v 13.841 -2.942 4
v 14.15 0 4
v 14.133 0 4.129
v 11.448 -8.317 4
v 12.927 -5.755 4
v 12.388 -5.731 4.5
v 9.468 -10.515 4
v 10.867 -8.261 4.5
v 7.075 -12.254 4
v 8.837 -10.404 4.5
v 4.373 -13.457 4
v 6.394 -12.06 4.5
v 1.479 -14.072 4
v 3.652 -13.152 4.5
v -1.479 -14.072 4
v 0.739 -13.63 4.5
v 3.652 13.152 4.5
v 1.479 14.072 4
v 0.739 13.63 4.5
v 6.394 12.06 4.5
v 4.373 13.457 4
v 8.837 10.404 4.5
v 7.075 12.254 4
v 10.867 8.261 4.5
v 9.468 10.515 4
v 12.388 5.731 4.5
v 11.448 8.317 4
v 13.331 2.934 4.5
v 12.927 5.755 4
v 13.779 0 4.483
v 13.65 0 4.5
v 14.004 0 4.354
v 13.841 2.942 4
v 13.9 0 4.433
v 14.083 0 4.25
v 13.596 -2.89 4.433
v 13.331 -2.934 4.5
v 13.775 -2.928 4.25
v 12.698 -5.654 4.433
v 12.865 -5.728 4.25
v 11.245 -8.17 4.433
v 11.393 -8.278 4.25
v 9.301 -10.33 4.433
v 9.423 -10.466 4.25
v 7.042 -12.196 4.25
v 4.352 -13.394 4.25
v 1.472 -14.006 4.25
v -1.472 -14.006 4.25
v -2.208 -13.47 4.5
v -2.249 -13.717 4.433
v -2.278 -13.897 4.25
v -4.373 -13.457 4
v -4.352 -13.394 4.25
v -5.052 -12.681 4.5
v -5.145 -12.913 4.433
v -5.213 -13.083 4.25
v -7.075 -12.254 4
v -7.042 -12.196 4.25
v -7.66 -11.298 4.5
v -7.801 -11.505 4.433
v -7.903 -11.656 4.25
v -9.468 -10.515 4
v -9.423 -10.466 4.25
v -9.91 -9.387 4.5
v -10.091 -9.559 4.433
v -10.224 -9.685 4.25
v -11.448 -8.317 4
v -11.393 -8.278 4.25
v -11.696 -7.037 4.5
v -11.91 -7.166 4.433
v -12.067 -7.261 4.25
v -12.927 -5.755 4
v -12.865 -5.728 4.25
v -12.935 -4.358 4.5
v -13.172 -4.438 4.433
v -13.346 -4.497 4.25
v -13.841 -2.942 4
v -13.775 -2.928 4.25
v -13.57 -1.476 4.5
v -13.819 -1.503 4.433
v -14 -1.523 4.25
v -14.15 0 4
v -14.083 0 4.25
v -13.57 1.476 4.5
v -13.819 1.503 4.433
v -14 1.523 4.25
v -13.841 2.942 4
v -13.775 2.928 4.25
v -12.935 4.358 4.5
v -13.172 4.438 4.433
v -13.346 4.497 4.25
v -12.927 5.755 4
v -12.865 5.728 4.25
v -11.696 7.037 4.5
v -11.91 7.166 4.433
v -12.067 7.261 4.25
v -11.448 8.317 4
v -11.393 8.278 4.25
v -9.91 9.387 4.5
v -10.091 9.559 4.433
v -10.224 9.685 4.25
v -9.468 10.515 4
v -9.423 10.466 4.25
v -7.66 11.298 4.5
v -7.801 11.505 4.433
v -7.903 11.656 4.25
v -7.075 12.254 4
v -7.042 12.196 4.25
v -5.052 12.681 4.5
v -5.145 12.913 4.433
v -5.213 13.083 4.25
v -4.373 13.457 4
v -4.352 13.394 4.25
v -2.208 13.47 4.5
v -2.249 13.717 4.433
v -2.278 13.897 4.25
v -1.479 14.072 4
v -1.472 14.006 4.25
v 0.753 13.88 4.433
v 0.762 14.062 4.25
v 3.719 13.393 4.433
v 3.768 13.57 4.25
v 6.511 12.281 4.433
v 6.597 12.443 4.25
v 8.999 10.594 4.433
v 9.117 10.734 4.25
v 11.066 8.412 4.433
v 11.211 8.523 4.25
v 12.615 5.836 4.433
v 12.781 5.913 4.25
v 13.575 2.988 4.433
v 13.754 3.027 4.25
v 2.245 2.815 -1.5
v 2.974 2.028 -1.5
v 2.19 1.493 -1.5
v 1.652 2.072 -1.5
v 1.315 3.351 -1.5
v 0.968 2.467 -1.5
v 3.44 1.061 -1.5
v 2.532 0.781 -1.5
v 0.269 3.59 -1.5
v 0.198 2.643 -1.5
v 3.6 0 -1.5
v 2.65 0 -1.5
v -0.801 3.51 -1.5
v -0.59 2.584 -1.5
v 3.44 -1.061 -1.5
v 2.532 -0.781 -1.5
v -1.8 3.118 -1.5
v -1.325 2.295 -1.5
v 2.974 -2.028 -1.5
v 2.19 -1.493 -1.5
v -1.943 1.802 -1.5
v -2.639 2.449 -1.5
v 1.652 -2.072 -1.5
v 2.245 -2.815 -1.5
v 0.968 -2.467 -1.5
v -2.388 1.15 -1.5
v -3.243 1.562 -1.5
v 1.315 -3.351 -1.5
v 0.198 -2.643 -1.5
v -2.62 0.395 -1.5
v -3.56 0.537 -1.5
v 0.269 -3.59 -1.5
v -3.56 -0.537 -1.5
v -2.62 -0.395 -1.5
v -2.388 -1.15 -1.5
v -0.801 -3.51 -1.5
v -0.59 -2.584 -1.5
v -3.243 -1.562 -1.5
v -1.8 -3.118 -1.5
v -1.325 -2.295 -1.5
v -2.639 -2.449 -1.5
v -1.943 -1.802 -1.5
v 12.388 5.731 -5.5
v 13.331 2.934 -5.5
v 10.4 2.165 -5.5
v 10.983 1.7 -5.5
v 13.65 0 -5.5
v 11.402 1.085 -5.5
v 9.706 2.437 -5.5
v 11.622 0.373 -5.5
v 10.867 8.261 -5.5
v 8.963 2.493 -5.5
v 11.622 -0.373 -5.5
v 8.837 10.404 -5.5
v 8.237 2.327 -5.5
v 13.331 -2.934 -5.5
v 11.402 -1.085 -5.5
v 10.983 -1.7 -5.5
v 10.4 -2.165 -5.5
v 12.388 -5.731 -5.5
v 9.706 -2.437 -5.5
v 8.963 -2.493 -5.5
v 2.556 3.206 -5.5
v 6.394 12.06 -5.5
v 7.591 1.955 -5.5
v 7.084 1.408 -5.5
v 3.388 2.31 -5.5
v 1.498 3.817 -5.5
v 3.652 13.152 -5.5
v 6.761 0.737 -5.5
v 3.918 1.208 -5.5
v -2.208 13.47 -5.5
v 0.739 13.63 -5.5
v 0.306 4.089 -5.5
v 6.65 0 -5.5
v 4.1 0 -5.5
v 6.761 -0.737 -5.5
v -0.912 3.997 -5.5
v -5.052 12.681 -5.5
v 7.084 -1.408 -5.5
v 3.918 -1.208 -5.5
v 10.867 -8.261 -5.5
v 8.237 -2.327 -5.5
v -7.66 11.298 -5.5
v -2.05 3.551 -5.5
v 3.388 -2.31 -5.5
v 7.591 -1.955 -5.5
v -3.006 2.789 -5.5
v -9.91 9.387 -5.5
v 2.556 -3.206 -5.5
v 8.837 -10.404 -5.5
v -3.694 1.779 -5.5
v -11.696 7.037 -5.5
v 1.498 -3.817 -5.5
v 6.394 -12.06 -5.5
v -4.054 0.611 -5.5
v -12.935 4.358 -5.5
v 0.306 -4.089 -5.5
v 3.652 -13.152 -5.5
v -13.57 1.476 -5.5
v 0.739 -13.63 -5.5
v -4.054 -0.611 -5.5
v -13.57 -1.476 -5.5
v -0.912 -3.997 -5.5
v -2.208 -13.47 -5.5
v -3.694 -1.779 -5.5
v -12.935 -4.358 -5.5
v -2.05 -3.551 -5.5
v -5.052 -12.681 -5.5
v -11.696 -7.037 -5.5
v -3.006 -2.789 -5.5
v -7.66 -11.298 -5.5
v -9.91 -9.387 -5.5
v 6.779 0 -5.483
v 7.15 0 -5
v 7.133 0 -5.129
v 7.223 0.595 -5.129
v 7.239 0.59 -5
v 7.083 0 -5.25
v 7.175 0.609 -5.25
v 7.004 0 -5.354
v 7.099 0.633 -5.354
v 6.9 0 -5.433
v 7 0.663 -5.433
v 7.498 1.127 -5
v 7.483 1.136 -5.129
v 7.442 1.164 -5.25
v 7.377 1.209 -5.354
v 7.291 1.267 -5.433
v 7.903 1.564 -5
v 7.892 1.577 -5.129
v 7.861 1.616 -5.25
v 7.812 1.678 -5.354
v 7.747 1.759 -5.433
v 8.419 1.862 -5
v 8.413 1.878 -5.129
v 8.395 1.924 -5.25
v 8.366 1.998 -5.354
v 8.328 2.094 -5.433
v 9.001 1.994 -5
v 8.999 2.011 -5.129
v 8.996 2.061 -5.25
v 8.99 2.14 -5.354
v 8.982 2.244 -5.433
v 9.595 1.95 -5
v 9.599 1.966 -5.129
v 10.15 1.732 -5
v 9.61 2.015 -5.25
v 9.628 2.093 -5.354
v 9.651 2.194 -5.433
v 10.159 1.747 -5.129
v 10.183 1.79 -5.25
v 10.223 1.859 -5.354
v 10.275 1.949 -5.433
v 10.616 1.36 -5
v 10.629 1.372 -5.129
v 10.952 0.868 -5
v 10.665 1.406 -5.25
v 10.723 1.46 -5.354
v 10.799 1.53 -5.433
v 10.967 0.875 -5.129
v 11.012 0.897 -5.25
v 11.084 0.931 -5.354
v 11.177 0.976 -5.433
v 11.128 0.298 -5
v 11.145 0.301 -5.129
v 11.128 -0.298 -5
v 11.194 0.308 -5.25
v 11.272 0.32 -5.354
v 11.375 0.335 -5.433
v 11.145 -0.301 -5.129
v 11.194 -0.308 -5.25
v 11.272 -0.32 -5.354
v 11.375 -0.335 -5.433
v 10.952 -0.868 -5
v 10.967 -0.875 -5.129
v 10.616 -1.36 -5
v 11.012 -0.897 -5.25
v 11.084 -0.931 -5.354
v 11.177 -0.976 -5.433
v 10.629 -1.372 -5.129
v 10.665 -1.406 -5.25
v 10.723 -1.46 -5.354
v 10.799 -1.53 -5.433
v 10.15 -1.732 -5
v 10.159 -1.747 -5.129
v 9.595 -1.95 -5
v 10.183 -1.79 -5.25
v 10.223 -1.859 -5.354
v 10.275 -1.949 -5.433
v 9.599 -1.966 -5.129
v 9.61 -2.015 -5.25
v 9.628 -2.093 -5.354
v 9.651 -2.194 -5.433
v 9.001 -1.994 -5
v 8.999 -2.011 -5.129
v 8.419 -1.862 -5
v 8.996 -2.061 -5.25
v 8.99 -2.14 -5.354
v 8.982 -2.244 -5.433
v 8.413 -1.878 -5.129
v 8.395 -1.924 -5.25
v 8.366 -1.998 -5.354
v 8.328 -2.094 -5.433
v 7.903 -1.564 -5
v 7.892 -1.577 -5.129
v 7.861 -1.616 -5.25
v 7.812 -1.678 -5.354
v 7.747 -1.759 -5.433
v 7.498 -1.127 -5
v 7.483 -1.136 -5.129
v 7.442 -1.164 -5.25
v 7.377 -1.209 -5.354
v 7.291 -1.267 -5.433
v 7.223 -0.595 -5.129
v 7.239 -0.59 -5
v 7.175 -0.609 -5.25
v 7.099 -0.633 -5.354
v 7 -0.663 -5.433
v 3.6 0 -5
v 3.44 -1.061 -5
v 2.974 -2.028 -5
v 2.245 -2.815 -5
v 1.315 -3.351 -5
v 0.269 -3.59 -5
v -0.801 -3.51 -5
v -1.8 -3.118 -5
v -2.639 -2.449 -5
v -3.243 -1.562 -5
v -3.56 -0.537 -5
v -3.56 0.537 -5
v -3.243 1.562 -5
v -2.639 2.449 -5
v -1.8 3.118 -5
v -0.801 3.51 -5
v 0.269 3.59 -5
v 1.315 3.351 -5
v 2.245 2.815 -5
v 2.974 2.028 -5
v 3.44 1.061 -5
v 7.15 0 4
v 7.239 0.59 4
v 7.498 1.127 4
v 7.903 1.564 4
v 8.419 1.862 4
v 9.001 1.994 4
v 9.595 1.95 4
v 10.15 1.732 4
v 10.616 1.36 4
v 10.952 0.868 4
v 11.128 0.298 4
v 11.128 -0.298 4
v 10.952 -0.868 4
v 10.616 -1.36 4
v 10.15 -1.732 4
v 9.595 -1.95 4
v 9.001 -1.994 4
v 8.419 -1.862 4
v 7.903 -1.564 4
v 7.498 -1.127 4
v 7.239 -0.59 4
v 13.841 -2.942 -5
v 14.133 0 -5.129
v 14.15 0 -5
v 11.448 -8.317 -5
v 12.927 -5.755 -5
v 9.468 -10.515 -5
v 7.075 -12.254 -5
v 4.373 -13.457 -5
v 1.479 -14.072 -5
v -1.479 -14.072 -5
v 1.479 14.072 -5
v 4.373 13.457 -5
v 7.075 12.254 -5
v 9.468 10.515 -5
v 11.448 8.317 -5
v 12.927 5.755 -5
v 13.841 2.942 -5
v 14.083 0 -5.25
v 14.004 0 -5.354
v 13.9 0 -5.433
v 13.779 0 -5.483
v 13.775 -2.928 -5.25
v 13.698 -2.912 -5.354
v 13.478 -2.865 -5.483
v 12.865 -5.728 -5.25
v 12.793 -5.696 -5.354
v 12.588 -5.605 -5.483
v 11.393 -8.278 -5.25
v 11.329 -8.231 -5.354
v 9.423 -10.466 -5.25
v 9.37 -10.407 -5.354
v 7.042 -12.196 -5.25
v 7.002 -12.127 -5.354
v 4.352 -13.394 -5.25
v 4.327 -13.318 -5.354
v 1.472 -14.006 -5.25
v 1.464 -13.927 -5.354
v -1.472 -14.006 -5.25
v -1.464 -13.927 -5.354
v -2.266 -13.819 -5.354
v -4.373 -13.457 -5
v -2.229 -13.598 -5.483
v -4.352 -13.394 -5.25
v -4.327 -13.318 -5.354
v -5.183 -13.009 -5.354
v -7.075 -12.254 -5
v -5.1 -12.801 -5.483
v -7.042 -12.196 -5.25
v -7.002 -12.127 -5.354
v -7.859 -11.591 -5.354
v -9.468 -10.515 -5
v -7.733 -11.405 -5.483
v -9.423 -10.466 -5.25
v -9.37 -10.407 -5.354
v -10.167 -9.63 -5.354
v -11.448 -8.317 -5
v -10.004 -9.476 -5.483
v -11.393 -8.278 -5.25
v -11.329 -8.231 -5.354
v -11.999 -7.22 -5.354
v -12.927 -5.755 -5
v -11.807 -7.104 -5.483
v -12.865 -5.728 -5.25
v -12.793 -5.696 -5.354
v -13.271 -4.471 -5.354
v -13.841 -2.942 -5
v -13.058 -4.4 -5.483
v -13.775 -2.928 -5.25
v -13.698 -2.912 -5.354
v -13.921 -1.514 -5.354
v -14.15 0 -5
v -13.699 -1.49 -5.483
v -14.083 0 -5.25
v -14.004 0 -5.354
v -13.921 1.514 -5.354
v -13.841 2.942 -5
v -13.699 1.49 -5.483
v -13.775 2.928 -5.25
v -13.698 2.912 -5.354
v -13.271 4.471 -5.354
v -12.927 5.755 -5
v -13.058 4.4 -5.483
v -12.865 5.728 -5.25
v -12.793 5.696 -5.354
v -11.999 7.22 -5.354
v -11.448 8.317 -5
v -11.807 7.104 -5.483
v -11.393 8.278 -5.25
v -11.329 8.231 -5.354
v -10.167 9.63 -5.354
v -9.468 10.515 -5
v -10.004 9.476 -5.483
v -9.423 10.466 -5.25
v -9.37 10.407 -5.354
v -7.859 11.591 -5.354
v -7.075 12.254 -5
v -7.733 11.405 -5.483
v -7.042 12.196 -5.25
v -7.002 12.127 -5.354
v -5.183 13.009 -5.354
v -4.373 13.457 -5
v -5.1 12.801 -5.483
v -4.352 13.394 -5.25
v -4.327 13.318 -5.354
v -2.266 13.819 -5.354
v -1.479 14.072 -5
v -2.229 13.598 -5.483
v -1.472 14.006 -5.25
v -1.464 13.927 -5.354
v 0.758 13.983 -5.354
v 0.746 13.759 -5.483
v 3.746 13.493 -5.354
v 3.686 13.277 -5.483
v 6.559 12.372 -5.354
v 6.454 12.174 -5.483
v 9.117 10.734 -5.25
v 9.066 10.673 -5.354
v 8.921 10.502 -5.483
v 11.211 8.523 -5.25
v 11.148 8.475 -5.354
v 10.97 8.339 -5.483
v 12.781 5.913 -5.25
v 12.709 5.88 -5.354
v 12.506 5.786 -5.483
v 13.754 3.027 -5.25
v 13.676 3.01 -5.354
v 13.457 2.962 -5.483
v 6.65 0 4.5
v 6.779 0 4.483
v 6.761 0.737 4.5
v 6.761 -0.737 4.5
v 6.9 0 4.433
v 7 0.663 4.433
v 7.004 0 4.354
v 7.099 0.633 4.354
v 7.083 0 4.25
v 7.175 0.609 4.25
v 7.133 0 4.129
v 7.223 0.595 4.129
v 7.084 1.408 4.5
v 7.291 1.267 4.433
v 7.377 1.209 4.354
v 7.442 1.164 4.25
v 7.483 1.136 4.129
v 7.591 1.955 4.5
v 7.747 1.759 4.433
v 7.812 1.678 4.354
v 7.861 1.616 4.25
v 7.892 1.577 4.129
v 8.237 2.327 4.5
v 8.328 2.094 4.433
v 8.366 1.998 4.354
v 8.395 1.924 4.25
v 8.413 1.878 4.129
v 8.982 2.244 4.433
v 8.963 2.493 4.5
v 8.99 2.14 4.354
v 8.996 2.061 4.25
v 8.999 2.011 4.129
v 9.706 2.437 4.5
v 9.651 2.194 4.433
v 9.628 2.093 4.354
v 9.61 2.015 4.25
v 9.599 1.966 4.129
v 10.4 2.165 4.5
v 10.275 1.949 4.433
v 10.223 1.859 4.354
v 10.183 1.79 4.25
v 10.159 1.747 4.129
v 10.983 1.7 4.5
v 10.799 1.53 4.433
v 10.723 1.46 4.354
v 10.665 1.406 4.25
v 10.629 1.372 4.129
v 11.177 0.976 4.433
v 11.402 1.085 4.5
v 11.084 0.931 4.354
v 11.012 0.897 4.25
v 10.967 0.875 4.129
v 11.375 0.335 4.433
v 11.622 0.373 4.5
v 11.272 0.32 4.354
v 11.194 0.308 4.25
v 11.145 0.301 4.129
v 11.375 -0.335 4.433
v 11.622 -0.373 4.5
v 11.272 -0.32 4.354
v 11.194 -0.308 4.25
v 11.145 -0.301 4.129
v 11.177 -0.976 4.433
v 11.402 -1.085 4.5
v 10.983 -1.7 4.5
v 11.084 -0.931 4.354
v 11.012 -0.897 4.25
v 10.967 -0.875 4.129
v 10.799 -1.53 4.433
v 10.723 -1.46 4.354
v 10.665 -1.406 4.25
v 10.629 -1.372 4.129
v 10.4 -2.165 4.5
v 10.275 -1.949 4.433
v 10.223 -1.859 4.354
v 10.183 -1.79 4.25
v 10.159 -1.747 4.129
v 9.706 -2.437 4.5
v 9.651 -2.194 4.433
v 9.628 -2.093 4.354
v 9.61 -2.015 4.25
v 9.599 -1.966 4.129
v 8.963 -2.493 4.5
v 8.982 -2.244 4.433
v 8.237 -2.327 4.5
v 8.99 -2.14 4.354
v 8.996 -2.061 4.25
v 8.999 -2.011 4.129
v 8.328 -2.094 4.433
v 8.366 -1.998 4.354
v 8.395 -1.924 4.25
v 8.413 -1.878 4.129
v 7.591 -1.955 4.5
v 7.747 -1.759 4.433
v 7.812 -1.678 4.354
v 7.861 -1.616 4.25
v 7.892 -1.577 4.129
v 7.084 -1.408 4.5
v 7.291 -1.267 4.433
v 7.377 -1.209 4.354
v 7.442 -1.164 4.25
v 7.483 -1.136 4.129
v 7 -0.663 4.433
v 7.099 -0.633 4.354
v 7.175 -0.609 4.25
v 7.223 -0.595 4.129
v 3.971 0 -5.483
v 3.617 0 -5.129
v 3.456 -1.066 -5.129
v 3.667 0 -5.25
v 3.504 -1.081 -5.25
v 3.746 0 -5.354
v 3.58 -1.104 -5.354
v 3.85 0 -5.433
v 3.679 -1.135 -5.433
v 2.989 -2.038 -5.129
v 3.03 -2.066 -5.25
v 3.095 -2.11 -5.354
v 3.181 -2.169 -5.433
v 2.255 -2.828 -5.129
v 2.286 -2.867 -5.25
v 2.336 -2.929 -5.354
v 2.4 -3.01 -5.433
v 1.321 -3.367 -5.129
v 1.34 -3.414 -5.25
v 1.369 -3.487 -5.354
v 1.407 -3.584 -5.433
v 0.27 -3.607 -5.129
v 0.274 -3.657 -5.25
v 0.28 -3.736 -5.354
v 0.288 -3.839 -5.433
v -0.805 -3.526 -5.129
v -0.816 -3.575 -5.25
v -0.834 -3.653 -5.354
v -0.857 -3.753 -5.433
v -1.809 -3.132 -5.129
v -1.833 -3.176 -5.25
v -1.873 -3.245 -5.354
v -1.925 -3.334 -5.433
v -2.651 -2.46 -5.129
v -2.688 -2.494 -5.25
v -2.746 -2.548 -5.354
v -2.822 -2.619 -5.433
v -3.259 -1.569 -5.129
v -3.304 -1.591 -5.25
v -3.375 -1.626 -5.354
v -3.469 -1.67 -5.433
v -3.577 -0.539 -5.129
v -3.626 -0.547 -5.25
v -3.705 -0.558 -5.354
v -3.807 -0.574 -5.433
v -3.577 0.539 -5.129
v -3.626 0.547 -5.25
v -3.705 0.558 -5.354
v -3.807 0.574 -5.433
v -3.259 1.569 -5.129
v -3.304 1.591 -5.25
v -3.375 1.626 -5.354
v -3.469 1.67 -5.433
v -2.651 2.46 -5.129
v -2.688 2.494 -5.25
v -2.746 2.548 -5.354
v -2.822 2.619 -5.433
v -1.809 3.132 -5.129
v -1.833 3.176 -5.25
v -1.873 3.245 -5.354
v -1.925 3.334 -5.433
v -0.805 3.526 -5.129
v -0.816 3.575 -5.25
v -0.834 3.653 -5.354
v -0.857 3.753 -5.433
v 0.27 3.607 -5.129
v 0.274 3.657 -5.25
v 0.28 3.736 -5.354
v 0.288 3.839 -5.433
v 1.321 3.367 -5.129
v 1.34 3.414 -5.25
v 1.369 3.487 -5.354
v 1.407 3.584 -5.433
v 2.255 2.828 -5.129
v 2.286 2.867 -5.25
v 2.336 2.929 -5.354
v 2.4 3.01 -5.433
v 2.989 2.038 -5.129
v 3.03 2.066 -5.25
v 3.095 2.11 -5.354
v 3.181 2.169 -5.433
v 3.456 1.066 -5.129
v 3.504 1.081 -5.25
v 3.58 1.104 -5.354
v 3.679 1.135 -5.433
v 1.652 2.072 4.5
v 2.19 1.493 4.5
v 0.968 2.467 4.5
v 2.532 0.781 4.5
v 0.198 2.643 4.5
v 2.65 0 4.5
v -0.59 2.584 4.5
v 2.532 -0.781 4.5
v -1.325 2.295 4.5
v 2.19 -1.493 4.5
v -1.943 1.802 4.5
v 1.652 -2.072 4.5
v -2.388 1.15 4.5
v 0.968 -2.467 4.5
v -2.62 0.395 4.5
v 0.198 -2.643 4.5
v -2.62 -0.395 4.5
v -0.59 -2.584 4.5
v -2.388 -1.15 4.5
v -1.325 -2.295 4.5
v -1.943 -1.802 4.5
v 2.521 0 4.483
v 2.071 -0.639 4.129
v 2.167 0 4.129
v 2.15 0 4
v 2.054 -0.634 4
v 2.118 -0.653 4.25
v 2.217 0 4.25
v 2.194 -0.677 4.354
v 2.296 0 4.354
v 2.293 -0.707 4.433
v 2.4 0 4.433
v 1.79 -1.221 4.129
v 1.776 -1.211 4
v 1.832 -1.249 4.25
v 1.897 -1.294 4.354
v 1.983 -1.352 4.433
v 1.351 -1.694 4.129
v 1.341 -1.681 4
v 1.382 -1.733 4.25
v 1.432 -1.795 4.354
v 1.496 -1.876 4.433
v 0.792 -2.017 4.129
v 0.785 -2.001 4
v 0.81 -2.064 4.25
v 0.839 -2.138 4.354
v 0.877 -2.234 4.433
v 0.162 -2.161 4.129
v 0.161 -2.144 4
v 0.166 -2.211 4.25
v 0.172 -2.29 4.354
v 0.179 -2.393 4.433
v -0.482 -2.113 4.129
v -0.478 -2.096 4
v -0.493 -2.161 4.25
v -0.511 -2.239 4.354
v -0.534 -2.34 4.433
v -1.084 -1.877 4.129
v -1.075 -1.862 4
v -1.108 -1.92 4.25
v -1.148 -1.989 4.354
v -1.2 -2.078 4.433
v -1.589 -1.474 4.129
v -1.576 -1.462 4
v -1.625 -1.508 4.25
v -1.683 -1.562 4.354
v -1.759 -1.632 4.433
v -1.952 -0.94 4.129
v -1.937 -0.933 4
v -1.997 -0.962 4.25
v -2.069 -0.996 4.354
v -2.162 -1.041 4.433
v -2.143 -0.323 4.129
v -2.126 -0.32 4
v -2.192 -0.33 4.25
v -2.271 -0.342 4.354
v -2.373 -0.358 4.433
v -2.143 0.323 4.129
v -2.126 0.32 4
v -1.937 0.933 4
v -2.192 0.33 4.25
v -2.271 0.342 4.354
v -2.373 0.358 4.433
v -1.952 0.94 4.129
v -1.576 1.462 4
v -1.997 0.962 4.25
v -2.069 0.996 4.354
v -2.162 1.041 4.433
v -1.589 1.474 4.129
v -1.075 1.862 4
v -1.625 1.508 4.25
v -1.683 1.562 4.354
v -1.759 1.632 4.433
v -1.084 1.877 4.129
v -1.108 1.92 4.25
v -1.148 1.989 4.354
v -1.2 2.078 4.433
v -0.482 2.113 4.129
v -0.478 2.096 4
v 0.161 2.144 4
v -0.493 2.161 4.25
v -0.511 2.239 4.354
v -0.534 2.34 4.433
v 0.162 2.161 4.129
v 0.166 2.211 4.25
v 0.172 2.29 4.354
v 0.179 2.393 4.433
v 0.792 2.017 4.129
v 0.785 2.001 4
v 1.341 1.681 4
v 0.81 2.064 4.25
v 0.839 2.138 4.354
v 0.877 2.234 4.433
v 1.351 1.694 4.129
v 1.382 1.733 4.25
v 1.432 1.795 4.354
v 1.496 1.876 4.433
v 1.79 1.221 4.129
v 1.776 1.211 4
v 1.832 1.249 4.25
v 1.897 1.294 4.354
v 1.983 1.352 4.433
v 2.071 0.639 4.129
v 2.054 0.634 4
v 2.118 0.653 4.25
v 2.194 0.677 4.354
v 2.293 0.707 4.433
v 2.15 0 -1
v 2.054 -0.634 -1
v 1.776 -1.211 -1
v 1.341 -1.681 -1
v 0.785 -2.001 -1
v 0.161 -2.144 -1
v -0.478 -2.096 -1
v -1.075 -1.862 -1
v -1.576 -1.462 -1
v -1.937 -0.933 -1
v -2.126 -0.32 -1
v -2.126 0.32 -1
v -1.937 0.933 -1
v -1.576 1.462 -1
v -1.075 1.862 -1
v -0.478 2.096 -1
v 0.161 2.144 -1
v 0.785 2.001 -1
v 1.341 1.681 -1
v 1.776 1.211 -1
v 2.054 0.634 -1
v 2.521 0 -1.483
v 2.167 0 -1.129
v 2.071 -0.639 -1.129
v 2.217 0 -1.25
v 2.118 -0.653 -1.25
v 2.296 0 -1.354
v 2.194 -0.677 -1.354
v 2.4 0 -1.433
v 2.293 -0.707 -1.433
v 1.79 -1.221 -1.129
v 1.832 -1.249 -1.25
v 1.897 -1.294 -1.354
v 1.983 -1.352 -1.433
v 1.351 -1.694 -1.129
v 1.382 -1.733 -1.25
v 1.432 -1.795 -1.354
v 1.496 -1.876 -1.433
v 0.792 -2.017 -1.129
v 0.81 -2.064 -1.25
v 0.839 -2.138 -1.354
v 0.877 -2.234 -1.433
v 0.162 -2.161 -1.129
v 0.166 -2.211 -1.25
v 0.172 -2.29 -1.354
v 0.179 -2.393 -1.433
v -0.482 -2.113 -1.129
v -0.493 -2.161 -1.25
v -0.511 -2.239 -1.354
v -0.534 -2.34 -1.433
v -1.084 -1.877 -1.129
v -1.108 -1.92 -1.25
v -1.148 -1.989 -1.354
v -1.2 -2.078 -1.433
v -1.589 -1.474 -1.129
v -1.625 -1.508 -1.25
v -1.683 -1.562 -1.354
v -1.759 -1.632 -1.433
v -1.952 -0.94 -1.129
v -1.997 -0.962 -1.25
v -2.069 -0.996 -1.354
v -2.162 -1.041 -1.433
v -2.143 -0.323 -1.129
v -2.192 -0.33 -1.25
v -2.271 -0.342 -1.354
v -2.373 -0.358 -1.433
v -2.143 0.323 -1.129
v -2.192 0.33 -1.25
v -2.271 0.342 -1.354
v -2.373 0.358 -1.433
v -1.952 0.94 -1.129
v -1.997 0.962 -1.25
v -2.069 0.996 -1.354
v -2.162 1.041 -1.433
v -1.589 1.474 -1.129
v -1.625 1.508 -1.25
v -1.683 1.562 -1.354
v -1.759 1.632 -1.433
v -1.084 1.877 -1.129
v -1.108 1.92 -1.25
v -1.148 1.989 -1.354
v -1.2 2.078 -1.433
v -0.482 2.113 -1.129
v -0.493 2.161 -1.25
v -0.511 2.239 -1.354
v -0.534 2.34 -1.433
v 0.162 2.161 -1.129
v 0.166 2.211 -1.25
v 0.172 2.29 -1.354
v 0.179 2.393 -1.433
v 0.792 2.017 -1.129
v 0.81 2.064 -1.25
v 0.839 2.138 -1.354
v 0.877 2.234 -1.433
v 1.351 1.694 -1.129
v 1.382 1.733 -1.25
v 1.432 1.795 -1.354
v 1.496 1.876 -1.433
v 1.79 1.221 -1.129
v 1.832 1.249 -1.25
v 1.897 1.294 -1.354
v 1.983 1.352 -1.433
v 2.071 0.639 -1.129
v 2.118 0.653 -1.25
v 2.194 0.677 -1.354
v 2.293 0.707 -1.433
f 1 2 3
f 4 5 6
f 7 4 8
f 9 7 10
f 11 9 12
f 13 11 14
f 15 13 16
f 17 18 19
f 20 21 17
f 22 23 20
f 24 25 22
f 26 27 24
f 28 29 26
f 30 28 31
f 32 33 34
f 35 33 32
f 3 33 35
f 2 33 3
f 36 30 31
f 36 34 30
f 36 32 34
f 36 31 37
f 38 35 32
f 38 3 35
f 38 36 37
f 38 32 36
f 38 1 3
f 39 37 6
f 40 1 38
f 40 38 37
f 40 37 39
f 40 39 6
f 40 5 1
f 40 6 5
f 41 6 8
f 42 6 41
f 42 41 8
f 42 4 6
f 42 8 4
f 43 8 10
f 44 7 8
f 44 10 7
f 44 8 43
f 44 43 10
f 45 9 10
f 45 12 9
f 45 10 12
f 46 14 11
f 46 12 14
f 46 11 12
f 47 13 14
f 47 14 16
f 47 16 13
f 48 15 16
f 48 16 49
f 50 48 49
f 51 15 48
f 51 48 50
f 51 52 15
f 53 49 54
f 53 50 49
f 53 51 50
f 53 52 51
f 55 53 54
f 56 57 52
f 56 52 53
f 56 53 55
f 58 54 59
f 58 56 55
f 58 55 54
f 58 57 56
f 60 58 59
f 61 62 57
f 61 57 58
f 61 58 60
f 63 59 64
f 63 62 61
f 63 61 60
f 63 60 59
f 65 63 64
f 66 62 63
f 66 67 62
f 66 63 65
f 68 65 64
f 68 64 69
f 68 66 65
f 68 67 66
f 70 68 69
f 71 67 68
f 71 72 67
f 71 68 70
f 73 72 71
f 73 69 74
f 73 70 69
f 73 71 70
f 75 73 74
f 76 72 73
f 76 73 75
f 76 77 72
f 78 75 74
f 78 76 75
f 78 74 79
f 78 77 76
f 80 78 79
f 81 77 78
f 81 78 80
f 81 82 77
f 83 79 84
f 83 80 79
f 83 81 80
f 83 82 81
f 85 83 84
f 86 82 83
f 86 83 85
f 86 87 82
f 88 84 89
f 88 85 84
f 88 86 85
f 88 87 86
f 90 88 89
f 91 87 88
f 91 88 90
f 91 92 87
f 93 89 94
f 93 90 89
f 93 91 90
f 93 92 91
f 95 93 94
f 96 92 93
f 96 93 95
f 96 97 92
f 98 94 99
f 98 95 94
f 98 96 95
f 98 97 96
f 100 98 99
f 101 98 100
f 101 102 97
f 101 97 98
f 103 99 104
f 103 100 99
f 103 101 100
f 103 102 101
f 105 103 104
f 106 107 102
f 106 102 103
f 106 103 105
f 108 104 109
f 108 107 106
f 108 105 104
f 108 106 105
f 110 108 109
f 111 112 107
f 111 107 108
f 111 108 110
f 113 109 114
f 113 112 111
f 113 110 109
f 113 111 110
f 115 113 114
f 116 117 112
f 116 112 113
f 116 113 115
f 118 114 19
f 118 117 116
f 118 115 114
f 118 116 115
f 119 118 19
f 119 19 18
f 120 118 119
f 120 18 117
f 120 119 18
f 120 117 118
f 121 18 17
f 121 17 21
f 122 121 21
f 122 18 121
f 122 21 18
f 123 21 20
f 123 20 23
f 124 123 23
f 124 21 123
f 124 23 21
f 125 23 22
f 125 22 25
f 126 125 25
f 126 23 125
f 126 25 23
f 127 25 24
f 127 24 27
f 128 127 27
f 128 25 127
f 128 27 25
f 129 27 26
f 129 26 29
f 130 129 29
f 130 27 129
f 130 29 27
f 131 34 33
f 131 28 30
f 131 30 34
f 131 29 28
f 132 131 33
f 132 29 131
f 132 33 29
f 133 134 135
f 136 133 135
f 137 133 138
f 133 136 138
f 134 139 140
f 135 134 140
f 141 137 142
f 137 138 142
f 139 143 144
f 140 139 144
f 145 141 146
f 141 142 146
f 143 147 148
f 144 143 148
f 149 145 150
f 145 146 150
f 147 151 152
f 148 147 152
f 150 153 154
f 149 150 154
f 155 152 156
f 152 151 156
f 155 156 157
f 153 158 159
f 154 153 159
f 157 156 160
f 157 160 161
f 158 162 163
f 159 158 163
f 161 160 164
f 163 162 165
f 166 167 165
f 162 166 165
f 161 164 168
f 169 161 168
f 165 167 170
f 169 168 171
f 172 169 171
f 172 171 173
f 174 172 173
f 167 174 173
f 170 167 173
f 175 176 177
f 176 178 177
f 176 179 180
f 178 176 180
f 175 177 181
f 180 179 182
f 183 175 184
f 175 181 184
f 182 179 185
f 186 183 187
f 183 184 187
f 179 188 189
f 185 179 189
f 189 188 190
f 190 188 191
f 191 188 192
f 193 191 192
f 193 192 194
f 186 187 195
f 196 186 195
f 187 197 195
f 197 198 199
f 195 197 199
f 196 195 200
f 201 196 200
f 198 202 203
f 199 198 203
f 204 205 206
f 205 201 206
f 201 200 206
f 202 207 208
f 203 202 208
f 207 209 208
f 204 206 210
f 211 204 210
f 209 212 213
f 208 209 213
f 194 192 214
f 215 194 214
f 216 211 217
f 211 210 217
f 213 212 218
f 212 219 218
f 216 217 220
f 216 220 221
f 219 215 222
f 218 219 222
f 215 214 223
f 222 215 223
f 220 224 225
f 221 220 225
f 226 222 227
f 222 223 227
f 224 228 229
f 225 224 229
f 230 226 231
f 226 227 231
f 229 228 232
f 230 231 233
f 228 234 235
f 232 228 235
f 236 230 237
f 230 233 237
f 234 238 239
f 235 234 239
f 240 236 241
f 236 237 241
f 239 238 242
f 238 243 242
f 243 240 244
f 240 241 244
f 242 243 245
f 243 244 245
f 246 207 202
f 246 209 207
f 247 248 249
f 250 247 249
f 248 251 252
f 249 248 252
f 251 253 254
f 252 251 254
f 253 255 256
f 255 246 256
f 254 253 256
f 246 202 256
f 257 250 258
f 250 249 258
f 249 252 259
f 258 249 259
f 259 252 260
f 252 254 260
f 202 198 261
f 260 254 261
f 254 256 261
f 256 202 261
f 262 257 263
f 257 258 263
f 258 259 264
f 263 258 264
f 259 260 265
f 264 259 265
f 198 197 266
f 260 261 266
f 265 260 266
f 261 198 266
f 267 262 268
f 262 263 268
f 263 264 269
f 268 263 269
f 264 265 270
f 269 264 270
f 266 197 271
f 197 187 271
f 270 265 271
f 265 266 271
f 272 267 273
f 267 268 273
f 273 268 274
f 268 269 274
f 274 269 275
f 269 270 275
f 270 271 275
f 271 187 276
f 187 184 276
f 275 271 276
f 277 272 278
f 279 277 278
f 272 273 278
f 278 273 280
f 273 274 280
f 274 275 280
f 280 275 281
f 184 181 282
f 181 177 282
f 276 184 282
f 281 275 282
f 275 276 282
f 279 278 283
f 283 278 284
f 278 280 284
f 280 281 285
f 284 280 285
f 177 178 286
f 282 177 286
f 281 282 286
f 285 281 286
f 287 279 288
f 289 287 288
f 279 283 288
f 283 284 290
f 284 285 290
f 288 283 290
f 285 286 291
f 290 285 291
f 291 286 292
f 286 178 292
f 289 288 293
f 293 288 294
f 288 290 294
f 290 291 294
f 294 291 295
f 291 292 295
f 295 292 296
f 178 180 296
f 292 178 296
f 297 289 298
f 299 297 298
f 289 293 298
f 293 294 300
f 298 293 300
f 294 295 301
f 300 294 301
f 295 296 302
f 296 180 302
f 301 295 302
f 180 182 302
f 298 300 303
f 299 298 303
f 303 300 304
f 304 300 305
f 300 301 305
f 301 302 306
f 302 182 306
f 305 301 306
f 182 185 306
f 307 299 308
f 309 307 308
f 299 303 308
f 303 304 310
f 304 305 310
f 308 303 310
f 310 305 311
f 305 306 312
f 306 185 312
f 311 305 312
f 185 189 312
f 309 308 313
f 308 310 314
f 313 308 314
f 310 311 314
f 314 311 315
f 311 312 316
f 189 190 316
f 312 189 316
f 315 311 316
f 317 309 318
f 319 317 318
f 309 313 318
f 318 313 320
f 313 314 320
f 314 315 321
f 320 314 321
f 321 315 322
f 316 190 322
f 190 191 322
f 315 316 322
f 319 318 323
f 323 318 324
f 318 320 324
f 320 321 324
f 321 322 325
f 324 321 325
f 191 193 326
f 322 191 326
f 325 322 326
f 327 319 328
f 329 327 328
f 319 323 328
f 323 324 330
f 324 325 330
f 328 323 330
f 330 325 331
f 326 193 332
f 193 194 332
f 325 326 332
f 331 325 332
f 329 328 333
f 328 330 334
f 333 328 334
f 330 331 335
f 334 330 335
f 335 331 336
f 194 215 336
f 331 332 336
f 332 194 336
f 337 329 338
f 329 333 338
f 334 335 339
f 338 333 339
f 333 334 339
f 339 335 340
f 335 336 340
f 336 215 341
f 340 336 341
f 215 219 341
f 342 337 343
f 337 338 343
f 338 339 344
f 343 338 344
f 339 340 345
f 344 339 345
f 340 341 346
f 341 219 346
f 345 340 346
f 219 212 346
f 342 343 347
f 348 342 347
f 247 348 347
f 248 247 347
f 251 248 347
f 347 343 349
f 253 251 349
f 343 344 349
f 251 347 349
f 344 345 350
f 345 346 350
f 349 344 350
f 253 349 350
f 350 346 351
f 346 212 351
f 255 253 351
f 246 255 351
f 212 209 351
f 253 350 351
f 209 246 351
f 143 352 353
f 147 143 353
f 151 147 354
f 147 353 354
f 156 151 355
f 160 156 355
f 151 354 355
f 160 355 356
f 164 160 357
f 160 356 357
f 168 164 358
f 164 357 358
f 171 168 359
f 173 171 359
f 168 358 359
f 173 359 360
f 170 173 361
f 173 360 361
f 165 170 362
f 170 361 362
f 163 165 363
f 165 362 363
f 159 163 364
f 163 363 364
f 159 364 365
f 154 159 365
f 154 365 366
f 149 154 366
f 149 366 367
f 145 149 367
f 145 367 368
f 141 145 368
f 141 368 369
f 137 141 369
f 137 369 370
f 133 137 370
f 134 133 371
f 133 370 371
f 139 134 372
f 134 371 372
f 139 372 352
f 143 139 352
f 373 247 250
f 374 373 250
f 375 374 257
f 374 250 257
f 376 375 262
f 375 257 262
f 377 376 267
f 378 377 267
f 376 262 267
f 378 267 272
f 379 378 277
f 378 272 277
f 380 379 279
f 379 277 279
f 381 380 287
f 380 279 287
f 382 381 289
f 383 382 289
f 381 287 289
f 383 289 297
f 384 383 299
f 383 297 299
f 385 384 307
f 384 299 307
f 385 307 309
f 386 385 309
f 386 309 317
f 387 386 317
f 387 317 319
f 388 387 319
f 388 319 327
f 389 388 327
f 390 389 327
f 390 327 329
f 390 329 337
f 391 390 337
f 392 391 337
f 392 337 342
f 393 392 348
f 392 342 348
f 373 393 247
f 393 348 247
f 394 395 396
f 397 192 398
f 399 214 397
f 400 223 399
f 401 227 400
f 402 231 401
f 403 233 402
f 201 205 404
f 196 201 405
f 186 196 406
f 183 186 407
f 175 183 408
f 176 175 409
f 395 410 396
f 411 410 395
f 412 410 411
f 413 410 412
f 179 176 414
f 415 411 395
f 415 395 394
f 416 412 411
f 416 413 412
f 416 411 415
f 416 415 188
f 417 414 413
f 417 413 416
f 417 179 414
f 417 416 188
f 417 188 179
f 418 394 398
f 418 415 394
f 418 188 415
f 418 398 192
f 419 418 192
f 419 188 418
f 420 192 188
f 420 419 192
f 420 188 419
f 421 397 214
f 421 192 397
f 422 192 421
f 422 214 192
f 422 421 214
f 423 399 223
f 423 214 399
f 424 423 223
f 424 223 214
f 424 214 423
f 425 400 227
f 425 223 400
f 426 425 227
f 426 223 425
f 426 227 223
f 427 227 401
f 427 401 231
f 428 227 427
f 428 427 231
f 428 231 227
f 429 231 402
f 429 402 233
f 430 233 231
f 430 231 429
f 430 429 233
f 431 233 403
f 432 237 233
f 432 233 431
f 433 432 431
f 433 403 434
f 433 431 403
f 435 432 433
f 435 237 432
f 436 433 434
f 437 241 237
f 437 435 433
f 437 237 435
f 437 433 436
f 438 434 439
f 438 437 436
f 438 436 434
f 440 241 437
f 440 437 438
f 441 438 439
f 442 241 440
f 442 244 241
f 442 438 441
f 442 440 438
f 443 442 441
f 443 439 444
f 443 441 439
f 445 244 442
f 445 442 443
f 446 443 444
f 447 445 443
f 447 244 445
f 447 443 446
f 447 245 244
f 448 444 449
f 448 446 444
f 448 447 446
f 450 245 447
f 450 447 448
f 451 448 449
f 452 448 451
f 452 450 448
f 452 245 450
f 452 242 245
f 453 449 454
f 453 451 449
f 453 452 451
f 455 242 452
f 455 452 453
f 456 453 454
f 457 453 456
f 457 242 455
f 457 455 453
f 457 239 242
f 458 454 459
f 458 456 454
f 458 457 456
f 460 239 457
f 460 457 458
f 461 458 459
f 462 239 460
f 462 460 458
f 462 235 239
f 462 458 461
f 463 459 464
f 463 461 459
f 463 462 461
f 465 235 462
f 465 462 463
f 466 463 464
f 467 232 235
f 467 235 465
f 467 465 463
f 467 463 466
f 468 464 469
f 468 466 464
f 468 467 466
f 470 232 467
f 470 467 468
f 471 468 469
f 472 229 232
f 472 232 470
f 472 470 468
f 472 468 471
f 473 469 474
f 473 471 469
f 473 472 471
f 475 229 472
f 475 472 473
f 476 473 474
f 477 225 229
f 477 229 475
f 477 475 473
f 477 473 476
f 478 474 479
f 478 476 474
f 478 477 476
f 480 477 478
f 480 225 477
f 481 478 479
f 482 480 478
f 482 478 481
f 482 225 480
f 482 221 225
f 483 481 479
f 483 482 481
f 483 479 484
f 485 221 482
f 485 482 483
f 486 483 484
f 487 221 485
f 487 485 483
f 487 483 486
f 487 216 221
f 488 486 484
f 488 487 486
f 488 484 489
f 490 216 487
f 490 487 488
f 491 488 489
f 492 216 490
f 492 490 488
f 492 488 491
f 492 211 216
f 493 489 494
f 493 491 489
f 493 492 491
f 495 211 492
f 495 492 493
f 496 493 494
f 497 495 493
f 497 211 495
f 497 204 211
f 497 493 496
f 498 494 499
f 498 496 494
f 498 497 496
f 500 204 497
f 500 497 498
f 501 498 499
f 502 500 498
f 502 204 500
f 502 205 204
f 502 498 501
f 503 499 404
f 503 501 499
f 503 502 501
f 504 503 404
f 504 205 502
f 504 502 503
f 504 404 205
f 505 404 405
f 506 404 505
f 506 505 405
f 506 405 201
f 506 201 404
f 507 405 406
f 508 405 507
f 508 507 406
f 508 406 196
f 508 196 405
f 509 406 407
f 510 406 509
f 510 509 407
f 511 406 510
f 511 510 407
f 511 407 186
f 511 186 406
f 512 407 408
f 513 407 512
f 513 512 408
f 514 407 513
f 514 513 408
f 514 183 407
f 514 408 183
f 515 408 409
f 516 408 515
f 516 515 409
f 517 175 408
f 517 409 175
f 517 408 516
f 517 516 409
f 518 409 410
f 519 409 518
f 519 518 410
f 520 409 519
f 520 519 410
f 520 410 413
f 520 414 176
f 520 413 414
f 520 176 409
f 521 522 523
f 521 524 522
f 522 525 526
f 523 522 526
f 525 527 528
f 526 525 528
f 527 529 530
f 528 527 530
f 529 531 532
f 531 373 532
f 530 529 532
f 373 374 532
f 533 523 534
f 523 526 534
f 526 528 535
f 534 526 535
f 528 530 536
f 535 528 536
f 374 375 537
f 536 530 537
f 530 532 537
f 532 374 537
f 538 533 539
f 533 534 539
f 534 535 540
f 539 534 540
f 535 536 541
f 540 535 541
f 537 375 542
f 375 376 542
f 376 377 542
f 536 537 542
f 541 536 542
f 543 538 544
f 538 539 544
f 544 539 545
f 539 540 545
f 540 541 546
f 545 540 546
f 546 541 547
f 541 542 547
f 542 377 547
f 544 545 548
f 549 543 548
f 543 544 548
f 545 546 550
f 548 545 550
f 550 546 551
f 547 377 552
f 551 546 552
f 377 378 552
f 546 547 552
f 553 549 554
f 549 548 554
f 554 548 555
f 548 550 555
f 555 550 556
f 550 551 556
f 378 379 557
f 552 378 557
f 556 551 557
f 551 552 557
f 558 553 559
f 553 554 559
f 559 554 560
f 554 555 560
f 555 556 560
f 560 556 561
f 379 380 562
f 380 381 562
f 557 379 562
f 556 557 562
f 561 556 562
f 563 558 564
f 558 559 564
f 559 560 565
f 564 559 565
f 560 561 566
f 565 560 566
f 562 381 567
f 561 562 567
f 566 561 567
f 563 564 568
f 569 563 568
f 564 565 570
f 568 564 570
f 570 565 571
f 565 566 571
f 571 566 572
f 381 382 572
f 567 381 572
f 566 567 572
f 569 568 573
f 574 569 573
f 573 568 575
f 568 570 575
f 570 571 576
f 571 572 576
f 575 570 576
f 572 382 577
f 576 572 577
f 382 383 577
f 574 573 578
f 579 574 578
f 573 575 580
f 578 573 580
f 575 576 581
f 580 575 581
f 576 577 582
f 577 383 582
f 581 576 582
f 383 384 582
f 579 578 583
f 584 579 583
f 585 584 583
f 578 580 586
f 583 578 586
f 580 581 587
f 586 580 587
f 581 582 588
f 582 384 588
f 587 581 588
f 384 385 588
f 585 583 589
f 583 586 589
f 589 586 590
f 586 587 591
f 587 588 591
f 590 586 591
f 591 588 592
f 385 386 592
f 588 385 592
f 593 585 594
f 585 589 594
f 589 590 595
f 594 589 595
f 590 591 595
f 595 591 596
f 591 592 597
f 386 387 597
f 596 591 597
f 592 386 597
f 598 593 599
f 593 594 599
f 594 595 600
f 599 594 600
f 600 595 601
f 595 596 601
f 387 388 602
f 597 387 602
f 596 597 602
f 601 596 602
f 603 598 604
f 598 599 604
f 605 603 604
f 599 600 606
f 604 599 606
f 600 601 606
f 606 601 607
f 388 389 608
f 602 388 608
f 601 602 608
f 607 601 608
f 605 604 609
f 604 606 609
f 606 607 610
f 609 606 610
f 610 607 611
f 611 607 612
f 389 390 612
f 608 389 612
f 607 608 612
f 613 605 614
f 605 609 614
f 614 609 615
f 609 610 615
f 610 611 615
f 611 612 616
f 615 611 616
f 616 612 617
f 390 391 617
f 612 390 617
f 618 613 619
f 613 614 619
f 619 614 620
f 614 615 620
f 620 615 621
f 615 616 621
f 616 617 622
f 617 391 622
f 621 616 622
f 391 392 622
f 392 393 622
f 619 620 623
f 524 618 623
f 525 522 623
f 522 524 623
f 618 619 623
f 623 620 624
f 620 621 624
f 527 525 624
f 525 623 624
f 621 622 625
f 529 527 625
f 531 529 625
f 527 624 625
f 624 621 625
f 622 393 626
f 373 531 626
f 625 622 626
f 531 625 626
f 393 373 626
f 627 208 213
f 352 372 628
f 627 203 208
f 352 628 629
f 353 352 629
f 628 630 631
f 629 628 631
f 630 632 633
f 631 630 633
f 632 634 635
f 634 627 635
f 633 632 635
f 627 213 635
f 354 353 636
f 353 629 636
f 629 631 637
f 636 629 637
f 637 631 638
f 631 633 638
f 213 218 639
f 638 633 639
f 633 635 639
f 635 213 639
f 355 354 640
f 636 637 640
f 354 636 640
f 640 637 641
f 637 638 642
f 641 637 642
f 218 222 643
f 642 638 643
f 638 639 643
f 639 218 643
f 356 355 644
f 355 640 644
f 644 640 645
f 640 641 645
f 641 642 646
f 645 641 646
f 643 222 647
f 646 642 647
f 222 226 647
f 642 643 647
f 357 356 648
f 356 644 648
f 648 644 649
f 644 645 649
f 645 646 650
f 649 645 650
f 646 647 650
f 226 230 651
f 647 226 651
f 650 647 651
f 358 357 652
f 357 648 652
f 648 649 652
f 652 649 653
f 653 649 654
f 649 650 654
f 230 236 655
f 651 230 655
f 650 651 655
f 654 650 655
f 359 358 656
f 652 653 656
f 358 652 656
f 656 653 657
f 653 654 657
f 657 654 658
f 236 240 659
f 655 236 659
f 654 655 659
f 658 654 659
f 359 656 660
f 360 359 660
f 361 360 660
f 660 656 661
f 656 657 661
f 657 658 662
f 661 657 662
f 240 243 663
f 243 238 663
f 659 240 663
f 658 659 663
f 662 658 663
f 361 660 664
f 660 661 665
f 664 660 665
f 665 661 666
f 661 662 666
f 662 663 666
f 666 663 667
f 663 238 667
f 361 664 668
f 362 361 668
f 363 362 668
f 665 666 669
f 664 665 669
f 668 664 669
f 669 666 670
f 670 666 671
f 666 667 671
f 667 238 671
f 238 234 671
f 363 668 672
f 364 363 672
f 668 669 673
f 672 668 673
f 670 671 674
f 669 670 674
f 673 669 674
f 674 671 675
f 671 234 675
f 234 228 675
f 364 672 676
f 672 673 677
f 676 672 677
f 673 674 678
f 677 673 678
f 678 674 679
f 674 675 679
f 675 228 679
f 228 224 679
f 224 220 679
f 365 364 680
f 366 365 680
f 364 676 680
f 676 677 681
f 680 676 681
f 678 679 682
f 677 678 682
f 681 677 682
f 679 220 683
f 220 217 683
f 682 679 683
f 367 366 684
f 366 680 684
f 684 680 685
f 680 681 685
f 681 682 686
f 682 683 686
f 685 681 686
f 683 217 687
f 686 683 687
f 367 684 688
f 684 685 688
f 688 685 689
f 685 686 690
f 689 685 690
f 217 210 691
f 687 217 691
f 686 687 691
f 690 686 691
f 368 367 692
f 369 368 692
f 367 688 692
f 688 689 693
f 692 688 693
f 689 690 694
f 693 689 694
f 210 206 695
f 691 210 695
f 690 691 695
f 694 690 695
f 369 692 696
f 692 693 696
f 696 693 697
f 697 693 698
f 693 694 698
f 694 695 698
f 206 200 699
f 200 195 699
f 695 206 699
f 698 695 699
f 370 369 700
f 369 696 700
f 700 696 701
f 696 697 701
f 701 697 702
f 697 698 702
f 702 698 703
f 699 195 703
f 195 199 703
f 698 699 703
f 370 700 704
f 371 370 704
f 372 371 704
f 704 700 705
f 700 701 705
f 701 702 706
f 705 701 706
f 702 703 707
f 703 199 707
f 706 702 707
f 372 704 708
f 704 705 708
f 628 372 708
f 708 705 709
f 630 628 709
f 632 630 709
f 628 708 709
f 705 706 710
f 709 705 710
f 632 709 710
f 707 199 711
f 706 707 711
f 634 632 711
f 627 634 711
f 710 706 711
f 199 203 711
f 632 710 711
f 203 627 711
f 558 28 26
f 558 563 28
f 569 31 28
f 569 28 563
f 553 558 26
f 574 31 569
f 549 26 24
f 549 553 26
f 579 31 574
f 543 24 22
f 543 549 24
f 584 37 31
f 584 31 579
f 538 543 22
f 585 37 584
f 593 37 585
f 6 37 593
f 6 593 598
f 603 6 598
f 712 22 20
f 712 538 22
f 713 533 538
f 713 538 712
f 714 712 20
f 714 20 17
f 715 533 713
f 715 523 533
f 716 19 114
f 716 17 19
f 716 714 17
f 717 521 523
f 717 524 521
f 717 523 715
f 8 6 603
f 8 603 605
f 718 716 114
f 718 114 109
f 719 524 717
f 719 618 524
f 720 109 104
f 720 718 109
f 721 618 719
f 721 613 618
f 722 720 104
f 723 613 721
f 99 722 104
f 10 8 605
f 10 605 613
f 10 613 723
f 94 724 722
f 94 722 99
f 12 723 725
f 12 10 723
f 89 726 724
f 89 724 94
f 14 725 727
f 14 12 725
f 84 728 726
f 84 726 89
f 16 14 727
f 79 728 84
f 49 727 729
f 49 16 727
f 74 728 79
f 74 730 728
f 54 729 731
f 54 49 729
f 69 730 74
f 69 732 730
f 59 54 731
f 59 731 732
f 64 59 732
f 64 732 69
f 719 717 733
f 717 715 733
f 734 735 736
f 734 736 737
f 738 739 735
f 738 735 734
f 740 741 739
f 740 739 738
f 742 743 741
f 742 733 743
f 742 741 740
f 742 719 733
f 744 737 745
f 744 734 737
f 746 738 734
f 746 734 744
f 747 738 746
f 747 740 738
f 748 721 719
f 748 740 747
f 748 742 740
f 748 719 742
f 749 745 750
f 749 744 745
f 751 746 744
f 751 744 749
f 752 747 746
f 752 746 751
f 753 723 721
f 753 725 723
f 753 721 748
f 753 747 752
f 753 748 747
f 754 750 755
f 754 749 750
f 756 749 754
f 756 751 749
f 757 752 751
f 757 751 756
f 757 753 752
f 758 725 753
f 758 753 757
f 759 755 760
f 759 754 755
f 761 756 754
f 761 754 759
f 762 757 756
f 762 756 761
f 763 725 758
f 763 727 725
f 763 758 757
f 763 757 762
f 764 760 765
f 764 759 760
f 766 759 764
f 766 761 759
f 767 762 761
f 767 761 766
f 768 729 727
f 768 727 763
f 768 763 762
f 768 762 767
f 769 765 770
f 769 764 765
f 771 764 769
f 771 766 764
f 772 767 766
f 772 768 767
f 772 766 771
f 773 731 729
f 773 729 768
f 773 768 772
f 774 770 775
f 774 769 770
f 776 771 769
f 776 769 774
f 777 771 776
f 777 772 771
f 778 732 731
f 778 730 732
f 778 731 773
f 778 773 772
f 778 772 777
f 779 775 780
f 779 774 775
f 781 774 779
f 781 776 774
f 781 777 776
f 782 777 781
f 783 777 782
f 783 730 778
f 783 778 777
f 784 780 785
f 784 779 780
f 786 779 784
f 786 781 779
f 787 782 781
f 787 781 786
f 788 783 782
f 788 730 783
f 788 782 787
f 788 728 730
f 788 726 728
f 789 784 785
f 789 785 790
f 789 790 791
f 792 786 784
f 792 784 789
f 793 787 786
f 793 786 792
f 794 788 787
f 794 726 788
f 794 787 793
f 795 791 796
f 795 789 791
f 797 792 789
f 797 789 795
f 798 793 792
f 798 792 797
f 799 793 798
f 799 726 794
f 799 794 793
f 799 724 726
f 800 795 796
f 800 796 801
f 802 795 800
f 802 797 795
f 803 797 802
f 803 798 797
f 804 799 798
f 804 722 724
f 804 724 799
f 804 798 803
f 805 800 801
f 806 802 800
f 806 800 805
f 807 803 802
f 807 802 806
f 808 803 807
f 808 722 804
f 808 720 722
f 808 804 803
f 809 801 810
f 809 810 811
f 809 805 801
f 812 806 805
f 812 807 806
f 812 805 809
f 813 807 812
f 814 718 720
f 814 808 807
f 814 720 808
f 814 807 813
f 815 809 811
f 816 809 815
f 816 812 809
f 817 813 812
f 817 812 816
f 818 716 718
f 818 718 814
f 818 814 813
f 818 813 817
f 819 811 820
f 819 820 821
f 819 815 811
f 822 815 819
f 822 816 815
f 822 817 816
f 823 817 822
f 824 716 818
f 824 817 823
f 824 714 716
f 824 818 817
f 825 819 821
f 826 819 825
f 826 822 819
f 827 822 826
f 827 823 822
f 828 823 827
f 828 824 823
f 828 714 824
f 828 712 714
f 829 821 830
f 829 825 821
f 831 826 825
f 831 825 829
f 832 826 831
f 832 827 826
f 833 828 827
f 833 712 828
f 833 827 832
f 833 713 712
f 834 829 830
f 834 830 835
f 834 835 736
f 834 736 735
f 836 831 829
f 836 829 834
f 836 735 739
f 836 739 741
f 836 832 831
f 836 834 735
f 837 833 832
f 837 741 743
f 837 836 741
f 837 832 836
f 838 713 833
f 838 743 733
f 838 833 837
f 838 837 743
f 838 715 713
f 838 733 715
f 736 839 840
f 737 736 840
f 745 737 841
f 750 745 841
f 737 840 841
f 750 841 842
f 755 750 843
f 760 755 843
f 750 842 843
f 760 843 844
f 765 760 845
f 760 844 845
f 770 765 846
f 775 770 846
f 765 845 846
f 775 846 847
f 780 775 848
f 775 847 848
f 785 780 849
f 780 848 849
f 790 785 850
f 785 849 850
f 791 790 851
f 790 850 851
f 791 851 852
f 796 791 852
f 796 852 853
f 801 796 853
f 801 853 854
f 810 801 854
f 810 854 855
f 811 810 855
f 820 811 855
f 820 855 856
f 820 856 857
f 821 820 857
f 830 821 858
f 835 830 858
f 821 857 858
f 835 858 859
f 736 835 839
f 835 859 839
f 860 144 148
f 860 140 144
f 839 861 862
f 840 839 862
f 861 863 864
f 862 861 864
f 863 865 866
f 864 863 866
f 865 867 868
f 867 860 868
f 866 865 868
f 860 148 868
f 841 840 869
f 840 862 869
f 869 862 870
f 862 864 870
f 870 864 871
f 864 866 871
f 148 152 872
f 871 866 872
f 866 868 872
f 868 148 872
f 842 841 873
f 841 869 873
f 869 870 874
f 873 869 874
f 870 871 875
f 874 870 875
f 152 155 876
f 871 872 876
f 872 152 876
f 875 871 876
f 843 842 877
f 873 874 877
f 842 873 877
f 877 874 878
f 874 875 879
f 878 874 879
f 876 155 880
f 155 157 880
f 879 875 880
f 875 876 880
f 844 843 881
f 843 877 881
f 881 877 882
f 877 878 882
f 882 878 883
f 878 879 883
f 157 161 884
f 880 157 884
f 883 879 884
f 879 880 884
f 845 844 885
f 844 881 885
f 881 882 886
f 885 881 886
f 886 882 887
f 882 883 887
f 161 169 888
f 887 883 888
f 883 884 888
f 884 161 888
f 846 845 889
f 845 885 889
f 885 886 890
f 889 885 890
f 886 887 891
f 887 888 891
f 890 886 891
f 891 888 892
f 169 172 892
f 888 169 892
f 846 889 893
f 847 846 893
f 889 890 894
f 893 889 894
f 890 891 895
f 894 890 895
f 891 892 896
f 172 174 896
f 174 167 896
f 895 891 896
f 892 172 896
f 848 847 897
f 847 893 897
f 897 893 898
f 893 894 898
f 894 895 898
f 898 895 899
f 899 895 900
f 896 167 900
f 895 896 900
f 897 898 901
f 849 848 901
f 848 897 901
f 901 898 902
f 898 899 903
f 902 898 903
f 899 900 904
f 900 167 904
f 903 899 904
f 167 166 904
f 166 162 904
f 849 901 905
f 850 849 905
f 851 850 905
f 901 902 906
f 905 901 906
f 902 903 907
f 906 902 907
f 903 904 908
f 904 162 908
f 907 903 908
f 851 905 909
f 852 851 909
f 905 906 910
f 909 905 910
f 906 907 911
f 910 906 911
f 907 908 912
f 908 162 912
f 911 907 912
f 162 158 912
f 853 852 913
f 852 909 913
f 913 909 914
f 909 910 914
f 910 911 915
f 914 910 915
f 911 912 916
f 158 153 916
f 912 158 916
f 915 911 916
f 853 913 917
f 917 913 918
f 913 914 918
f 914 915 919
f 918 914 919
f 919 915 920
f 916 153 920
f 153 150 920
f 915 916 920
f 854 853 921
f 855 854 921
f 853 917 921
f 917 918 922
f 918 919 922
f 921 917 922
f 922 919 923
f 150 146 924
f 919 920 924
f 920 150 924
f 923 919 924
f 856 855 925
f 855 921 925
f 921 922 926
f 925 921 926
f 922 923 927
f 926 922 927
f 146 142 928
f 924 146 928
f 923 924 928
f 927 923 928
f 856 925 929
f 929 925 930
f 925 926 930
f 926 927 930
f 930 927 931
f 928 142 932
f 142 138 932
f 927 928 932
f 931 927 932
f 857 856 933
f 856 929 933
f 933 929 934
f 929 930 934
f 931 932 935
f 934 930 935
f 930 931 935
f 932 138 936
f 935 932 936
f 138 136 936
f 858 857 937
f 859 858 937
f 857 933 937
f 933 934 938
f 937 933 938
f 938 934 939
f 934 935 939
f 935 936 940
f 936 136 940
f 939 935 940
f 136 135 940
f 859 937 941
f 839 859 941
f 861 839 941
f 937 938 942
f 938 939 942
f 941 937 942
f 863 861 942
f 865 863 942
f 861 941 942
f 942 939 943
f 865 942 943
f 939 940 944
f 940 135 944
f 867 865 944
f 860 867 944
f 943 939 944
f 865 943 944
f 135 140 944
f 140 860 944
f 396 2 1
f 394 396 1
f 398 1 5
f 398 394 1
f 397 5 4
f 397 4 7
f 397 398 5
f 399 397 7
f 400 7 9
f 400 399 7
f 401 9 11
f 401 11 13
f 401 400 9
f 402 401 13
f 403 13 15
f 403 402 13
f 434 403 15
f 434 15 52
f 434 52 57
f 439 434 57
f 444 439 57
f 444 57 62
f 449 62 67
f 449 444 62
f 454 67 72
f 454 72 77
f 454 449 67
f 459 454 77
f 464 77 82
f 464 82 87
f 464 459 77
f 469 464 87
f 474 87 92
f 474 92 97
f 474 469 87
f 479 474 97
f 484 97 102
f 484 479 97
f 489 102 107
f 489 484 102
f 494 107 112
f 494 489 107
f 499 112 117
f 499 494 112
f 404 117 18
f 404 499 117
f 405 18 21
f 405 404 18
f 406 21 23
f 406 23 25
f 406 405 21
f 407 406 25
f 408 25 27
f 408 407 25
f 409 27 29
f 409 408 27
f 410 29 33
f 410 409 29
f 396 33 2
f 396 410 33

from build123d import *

# Parameters (mm, degrees)
SKETCH1_W          = 12
SKETCH1_H          = 6
SKETCH1_W_2        = 10.55
SKETCH1_H_2        = 4
SKETCH2_R          = 2
CUT_EXTRUDE1_DEPTH = 10
FILLET2_R          = 0.5


with BuildPart() as part:
    # Sketch1 → Revolve1 (revolve)
    with BuildSketch(Plane(origin=(0, 0, 0), x_dir=(1, 0, 0), z_dir=(0, 1, 0))):
        with Locations((8.15, -1.5)):
            Rectangle(SKETCH1_W, SKETCH1_H)
        with Locations((8.875, 3.5)):
            Rectangle(SKETCH1_W_2, SKETCH1_H_2)
    revolve(axis=Axis((0, 0, 0), (0, 0, -1)))

    # Sketch2 → Cut-Extrude1 (cut)
    with BuildSketch(Plane(origin=(0, 0, -5.5), x_dir=(-1, 0, 0), z_dir=(0, 0, -1))):
        with Locations((-9.15, 0)):
            Circle(SKETCH2_R)
    extrude(amount=-CUT_EXTRUDE1_DEPTH, mode=Mode.SUBTRACT)

    # Fillet2
    fillet2_edges = [part.edges().sort_by_distance(p)[0] for p in [
        (11.15, 0, 4.5),
        (11.15, 0, -5.5),
        (-2.15, 0, -1.5),
        (-3.6, 0, -5.5),
        (-14.15, 0, -5.5),
        (-14.15, 0, 4.5),
        (-2.15, 0, 4.5),
    ]]
    fillet(fillet2_edges, radius=FILLET2_R)


solid = part.part
